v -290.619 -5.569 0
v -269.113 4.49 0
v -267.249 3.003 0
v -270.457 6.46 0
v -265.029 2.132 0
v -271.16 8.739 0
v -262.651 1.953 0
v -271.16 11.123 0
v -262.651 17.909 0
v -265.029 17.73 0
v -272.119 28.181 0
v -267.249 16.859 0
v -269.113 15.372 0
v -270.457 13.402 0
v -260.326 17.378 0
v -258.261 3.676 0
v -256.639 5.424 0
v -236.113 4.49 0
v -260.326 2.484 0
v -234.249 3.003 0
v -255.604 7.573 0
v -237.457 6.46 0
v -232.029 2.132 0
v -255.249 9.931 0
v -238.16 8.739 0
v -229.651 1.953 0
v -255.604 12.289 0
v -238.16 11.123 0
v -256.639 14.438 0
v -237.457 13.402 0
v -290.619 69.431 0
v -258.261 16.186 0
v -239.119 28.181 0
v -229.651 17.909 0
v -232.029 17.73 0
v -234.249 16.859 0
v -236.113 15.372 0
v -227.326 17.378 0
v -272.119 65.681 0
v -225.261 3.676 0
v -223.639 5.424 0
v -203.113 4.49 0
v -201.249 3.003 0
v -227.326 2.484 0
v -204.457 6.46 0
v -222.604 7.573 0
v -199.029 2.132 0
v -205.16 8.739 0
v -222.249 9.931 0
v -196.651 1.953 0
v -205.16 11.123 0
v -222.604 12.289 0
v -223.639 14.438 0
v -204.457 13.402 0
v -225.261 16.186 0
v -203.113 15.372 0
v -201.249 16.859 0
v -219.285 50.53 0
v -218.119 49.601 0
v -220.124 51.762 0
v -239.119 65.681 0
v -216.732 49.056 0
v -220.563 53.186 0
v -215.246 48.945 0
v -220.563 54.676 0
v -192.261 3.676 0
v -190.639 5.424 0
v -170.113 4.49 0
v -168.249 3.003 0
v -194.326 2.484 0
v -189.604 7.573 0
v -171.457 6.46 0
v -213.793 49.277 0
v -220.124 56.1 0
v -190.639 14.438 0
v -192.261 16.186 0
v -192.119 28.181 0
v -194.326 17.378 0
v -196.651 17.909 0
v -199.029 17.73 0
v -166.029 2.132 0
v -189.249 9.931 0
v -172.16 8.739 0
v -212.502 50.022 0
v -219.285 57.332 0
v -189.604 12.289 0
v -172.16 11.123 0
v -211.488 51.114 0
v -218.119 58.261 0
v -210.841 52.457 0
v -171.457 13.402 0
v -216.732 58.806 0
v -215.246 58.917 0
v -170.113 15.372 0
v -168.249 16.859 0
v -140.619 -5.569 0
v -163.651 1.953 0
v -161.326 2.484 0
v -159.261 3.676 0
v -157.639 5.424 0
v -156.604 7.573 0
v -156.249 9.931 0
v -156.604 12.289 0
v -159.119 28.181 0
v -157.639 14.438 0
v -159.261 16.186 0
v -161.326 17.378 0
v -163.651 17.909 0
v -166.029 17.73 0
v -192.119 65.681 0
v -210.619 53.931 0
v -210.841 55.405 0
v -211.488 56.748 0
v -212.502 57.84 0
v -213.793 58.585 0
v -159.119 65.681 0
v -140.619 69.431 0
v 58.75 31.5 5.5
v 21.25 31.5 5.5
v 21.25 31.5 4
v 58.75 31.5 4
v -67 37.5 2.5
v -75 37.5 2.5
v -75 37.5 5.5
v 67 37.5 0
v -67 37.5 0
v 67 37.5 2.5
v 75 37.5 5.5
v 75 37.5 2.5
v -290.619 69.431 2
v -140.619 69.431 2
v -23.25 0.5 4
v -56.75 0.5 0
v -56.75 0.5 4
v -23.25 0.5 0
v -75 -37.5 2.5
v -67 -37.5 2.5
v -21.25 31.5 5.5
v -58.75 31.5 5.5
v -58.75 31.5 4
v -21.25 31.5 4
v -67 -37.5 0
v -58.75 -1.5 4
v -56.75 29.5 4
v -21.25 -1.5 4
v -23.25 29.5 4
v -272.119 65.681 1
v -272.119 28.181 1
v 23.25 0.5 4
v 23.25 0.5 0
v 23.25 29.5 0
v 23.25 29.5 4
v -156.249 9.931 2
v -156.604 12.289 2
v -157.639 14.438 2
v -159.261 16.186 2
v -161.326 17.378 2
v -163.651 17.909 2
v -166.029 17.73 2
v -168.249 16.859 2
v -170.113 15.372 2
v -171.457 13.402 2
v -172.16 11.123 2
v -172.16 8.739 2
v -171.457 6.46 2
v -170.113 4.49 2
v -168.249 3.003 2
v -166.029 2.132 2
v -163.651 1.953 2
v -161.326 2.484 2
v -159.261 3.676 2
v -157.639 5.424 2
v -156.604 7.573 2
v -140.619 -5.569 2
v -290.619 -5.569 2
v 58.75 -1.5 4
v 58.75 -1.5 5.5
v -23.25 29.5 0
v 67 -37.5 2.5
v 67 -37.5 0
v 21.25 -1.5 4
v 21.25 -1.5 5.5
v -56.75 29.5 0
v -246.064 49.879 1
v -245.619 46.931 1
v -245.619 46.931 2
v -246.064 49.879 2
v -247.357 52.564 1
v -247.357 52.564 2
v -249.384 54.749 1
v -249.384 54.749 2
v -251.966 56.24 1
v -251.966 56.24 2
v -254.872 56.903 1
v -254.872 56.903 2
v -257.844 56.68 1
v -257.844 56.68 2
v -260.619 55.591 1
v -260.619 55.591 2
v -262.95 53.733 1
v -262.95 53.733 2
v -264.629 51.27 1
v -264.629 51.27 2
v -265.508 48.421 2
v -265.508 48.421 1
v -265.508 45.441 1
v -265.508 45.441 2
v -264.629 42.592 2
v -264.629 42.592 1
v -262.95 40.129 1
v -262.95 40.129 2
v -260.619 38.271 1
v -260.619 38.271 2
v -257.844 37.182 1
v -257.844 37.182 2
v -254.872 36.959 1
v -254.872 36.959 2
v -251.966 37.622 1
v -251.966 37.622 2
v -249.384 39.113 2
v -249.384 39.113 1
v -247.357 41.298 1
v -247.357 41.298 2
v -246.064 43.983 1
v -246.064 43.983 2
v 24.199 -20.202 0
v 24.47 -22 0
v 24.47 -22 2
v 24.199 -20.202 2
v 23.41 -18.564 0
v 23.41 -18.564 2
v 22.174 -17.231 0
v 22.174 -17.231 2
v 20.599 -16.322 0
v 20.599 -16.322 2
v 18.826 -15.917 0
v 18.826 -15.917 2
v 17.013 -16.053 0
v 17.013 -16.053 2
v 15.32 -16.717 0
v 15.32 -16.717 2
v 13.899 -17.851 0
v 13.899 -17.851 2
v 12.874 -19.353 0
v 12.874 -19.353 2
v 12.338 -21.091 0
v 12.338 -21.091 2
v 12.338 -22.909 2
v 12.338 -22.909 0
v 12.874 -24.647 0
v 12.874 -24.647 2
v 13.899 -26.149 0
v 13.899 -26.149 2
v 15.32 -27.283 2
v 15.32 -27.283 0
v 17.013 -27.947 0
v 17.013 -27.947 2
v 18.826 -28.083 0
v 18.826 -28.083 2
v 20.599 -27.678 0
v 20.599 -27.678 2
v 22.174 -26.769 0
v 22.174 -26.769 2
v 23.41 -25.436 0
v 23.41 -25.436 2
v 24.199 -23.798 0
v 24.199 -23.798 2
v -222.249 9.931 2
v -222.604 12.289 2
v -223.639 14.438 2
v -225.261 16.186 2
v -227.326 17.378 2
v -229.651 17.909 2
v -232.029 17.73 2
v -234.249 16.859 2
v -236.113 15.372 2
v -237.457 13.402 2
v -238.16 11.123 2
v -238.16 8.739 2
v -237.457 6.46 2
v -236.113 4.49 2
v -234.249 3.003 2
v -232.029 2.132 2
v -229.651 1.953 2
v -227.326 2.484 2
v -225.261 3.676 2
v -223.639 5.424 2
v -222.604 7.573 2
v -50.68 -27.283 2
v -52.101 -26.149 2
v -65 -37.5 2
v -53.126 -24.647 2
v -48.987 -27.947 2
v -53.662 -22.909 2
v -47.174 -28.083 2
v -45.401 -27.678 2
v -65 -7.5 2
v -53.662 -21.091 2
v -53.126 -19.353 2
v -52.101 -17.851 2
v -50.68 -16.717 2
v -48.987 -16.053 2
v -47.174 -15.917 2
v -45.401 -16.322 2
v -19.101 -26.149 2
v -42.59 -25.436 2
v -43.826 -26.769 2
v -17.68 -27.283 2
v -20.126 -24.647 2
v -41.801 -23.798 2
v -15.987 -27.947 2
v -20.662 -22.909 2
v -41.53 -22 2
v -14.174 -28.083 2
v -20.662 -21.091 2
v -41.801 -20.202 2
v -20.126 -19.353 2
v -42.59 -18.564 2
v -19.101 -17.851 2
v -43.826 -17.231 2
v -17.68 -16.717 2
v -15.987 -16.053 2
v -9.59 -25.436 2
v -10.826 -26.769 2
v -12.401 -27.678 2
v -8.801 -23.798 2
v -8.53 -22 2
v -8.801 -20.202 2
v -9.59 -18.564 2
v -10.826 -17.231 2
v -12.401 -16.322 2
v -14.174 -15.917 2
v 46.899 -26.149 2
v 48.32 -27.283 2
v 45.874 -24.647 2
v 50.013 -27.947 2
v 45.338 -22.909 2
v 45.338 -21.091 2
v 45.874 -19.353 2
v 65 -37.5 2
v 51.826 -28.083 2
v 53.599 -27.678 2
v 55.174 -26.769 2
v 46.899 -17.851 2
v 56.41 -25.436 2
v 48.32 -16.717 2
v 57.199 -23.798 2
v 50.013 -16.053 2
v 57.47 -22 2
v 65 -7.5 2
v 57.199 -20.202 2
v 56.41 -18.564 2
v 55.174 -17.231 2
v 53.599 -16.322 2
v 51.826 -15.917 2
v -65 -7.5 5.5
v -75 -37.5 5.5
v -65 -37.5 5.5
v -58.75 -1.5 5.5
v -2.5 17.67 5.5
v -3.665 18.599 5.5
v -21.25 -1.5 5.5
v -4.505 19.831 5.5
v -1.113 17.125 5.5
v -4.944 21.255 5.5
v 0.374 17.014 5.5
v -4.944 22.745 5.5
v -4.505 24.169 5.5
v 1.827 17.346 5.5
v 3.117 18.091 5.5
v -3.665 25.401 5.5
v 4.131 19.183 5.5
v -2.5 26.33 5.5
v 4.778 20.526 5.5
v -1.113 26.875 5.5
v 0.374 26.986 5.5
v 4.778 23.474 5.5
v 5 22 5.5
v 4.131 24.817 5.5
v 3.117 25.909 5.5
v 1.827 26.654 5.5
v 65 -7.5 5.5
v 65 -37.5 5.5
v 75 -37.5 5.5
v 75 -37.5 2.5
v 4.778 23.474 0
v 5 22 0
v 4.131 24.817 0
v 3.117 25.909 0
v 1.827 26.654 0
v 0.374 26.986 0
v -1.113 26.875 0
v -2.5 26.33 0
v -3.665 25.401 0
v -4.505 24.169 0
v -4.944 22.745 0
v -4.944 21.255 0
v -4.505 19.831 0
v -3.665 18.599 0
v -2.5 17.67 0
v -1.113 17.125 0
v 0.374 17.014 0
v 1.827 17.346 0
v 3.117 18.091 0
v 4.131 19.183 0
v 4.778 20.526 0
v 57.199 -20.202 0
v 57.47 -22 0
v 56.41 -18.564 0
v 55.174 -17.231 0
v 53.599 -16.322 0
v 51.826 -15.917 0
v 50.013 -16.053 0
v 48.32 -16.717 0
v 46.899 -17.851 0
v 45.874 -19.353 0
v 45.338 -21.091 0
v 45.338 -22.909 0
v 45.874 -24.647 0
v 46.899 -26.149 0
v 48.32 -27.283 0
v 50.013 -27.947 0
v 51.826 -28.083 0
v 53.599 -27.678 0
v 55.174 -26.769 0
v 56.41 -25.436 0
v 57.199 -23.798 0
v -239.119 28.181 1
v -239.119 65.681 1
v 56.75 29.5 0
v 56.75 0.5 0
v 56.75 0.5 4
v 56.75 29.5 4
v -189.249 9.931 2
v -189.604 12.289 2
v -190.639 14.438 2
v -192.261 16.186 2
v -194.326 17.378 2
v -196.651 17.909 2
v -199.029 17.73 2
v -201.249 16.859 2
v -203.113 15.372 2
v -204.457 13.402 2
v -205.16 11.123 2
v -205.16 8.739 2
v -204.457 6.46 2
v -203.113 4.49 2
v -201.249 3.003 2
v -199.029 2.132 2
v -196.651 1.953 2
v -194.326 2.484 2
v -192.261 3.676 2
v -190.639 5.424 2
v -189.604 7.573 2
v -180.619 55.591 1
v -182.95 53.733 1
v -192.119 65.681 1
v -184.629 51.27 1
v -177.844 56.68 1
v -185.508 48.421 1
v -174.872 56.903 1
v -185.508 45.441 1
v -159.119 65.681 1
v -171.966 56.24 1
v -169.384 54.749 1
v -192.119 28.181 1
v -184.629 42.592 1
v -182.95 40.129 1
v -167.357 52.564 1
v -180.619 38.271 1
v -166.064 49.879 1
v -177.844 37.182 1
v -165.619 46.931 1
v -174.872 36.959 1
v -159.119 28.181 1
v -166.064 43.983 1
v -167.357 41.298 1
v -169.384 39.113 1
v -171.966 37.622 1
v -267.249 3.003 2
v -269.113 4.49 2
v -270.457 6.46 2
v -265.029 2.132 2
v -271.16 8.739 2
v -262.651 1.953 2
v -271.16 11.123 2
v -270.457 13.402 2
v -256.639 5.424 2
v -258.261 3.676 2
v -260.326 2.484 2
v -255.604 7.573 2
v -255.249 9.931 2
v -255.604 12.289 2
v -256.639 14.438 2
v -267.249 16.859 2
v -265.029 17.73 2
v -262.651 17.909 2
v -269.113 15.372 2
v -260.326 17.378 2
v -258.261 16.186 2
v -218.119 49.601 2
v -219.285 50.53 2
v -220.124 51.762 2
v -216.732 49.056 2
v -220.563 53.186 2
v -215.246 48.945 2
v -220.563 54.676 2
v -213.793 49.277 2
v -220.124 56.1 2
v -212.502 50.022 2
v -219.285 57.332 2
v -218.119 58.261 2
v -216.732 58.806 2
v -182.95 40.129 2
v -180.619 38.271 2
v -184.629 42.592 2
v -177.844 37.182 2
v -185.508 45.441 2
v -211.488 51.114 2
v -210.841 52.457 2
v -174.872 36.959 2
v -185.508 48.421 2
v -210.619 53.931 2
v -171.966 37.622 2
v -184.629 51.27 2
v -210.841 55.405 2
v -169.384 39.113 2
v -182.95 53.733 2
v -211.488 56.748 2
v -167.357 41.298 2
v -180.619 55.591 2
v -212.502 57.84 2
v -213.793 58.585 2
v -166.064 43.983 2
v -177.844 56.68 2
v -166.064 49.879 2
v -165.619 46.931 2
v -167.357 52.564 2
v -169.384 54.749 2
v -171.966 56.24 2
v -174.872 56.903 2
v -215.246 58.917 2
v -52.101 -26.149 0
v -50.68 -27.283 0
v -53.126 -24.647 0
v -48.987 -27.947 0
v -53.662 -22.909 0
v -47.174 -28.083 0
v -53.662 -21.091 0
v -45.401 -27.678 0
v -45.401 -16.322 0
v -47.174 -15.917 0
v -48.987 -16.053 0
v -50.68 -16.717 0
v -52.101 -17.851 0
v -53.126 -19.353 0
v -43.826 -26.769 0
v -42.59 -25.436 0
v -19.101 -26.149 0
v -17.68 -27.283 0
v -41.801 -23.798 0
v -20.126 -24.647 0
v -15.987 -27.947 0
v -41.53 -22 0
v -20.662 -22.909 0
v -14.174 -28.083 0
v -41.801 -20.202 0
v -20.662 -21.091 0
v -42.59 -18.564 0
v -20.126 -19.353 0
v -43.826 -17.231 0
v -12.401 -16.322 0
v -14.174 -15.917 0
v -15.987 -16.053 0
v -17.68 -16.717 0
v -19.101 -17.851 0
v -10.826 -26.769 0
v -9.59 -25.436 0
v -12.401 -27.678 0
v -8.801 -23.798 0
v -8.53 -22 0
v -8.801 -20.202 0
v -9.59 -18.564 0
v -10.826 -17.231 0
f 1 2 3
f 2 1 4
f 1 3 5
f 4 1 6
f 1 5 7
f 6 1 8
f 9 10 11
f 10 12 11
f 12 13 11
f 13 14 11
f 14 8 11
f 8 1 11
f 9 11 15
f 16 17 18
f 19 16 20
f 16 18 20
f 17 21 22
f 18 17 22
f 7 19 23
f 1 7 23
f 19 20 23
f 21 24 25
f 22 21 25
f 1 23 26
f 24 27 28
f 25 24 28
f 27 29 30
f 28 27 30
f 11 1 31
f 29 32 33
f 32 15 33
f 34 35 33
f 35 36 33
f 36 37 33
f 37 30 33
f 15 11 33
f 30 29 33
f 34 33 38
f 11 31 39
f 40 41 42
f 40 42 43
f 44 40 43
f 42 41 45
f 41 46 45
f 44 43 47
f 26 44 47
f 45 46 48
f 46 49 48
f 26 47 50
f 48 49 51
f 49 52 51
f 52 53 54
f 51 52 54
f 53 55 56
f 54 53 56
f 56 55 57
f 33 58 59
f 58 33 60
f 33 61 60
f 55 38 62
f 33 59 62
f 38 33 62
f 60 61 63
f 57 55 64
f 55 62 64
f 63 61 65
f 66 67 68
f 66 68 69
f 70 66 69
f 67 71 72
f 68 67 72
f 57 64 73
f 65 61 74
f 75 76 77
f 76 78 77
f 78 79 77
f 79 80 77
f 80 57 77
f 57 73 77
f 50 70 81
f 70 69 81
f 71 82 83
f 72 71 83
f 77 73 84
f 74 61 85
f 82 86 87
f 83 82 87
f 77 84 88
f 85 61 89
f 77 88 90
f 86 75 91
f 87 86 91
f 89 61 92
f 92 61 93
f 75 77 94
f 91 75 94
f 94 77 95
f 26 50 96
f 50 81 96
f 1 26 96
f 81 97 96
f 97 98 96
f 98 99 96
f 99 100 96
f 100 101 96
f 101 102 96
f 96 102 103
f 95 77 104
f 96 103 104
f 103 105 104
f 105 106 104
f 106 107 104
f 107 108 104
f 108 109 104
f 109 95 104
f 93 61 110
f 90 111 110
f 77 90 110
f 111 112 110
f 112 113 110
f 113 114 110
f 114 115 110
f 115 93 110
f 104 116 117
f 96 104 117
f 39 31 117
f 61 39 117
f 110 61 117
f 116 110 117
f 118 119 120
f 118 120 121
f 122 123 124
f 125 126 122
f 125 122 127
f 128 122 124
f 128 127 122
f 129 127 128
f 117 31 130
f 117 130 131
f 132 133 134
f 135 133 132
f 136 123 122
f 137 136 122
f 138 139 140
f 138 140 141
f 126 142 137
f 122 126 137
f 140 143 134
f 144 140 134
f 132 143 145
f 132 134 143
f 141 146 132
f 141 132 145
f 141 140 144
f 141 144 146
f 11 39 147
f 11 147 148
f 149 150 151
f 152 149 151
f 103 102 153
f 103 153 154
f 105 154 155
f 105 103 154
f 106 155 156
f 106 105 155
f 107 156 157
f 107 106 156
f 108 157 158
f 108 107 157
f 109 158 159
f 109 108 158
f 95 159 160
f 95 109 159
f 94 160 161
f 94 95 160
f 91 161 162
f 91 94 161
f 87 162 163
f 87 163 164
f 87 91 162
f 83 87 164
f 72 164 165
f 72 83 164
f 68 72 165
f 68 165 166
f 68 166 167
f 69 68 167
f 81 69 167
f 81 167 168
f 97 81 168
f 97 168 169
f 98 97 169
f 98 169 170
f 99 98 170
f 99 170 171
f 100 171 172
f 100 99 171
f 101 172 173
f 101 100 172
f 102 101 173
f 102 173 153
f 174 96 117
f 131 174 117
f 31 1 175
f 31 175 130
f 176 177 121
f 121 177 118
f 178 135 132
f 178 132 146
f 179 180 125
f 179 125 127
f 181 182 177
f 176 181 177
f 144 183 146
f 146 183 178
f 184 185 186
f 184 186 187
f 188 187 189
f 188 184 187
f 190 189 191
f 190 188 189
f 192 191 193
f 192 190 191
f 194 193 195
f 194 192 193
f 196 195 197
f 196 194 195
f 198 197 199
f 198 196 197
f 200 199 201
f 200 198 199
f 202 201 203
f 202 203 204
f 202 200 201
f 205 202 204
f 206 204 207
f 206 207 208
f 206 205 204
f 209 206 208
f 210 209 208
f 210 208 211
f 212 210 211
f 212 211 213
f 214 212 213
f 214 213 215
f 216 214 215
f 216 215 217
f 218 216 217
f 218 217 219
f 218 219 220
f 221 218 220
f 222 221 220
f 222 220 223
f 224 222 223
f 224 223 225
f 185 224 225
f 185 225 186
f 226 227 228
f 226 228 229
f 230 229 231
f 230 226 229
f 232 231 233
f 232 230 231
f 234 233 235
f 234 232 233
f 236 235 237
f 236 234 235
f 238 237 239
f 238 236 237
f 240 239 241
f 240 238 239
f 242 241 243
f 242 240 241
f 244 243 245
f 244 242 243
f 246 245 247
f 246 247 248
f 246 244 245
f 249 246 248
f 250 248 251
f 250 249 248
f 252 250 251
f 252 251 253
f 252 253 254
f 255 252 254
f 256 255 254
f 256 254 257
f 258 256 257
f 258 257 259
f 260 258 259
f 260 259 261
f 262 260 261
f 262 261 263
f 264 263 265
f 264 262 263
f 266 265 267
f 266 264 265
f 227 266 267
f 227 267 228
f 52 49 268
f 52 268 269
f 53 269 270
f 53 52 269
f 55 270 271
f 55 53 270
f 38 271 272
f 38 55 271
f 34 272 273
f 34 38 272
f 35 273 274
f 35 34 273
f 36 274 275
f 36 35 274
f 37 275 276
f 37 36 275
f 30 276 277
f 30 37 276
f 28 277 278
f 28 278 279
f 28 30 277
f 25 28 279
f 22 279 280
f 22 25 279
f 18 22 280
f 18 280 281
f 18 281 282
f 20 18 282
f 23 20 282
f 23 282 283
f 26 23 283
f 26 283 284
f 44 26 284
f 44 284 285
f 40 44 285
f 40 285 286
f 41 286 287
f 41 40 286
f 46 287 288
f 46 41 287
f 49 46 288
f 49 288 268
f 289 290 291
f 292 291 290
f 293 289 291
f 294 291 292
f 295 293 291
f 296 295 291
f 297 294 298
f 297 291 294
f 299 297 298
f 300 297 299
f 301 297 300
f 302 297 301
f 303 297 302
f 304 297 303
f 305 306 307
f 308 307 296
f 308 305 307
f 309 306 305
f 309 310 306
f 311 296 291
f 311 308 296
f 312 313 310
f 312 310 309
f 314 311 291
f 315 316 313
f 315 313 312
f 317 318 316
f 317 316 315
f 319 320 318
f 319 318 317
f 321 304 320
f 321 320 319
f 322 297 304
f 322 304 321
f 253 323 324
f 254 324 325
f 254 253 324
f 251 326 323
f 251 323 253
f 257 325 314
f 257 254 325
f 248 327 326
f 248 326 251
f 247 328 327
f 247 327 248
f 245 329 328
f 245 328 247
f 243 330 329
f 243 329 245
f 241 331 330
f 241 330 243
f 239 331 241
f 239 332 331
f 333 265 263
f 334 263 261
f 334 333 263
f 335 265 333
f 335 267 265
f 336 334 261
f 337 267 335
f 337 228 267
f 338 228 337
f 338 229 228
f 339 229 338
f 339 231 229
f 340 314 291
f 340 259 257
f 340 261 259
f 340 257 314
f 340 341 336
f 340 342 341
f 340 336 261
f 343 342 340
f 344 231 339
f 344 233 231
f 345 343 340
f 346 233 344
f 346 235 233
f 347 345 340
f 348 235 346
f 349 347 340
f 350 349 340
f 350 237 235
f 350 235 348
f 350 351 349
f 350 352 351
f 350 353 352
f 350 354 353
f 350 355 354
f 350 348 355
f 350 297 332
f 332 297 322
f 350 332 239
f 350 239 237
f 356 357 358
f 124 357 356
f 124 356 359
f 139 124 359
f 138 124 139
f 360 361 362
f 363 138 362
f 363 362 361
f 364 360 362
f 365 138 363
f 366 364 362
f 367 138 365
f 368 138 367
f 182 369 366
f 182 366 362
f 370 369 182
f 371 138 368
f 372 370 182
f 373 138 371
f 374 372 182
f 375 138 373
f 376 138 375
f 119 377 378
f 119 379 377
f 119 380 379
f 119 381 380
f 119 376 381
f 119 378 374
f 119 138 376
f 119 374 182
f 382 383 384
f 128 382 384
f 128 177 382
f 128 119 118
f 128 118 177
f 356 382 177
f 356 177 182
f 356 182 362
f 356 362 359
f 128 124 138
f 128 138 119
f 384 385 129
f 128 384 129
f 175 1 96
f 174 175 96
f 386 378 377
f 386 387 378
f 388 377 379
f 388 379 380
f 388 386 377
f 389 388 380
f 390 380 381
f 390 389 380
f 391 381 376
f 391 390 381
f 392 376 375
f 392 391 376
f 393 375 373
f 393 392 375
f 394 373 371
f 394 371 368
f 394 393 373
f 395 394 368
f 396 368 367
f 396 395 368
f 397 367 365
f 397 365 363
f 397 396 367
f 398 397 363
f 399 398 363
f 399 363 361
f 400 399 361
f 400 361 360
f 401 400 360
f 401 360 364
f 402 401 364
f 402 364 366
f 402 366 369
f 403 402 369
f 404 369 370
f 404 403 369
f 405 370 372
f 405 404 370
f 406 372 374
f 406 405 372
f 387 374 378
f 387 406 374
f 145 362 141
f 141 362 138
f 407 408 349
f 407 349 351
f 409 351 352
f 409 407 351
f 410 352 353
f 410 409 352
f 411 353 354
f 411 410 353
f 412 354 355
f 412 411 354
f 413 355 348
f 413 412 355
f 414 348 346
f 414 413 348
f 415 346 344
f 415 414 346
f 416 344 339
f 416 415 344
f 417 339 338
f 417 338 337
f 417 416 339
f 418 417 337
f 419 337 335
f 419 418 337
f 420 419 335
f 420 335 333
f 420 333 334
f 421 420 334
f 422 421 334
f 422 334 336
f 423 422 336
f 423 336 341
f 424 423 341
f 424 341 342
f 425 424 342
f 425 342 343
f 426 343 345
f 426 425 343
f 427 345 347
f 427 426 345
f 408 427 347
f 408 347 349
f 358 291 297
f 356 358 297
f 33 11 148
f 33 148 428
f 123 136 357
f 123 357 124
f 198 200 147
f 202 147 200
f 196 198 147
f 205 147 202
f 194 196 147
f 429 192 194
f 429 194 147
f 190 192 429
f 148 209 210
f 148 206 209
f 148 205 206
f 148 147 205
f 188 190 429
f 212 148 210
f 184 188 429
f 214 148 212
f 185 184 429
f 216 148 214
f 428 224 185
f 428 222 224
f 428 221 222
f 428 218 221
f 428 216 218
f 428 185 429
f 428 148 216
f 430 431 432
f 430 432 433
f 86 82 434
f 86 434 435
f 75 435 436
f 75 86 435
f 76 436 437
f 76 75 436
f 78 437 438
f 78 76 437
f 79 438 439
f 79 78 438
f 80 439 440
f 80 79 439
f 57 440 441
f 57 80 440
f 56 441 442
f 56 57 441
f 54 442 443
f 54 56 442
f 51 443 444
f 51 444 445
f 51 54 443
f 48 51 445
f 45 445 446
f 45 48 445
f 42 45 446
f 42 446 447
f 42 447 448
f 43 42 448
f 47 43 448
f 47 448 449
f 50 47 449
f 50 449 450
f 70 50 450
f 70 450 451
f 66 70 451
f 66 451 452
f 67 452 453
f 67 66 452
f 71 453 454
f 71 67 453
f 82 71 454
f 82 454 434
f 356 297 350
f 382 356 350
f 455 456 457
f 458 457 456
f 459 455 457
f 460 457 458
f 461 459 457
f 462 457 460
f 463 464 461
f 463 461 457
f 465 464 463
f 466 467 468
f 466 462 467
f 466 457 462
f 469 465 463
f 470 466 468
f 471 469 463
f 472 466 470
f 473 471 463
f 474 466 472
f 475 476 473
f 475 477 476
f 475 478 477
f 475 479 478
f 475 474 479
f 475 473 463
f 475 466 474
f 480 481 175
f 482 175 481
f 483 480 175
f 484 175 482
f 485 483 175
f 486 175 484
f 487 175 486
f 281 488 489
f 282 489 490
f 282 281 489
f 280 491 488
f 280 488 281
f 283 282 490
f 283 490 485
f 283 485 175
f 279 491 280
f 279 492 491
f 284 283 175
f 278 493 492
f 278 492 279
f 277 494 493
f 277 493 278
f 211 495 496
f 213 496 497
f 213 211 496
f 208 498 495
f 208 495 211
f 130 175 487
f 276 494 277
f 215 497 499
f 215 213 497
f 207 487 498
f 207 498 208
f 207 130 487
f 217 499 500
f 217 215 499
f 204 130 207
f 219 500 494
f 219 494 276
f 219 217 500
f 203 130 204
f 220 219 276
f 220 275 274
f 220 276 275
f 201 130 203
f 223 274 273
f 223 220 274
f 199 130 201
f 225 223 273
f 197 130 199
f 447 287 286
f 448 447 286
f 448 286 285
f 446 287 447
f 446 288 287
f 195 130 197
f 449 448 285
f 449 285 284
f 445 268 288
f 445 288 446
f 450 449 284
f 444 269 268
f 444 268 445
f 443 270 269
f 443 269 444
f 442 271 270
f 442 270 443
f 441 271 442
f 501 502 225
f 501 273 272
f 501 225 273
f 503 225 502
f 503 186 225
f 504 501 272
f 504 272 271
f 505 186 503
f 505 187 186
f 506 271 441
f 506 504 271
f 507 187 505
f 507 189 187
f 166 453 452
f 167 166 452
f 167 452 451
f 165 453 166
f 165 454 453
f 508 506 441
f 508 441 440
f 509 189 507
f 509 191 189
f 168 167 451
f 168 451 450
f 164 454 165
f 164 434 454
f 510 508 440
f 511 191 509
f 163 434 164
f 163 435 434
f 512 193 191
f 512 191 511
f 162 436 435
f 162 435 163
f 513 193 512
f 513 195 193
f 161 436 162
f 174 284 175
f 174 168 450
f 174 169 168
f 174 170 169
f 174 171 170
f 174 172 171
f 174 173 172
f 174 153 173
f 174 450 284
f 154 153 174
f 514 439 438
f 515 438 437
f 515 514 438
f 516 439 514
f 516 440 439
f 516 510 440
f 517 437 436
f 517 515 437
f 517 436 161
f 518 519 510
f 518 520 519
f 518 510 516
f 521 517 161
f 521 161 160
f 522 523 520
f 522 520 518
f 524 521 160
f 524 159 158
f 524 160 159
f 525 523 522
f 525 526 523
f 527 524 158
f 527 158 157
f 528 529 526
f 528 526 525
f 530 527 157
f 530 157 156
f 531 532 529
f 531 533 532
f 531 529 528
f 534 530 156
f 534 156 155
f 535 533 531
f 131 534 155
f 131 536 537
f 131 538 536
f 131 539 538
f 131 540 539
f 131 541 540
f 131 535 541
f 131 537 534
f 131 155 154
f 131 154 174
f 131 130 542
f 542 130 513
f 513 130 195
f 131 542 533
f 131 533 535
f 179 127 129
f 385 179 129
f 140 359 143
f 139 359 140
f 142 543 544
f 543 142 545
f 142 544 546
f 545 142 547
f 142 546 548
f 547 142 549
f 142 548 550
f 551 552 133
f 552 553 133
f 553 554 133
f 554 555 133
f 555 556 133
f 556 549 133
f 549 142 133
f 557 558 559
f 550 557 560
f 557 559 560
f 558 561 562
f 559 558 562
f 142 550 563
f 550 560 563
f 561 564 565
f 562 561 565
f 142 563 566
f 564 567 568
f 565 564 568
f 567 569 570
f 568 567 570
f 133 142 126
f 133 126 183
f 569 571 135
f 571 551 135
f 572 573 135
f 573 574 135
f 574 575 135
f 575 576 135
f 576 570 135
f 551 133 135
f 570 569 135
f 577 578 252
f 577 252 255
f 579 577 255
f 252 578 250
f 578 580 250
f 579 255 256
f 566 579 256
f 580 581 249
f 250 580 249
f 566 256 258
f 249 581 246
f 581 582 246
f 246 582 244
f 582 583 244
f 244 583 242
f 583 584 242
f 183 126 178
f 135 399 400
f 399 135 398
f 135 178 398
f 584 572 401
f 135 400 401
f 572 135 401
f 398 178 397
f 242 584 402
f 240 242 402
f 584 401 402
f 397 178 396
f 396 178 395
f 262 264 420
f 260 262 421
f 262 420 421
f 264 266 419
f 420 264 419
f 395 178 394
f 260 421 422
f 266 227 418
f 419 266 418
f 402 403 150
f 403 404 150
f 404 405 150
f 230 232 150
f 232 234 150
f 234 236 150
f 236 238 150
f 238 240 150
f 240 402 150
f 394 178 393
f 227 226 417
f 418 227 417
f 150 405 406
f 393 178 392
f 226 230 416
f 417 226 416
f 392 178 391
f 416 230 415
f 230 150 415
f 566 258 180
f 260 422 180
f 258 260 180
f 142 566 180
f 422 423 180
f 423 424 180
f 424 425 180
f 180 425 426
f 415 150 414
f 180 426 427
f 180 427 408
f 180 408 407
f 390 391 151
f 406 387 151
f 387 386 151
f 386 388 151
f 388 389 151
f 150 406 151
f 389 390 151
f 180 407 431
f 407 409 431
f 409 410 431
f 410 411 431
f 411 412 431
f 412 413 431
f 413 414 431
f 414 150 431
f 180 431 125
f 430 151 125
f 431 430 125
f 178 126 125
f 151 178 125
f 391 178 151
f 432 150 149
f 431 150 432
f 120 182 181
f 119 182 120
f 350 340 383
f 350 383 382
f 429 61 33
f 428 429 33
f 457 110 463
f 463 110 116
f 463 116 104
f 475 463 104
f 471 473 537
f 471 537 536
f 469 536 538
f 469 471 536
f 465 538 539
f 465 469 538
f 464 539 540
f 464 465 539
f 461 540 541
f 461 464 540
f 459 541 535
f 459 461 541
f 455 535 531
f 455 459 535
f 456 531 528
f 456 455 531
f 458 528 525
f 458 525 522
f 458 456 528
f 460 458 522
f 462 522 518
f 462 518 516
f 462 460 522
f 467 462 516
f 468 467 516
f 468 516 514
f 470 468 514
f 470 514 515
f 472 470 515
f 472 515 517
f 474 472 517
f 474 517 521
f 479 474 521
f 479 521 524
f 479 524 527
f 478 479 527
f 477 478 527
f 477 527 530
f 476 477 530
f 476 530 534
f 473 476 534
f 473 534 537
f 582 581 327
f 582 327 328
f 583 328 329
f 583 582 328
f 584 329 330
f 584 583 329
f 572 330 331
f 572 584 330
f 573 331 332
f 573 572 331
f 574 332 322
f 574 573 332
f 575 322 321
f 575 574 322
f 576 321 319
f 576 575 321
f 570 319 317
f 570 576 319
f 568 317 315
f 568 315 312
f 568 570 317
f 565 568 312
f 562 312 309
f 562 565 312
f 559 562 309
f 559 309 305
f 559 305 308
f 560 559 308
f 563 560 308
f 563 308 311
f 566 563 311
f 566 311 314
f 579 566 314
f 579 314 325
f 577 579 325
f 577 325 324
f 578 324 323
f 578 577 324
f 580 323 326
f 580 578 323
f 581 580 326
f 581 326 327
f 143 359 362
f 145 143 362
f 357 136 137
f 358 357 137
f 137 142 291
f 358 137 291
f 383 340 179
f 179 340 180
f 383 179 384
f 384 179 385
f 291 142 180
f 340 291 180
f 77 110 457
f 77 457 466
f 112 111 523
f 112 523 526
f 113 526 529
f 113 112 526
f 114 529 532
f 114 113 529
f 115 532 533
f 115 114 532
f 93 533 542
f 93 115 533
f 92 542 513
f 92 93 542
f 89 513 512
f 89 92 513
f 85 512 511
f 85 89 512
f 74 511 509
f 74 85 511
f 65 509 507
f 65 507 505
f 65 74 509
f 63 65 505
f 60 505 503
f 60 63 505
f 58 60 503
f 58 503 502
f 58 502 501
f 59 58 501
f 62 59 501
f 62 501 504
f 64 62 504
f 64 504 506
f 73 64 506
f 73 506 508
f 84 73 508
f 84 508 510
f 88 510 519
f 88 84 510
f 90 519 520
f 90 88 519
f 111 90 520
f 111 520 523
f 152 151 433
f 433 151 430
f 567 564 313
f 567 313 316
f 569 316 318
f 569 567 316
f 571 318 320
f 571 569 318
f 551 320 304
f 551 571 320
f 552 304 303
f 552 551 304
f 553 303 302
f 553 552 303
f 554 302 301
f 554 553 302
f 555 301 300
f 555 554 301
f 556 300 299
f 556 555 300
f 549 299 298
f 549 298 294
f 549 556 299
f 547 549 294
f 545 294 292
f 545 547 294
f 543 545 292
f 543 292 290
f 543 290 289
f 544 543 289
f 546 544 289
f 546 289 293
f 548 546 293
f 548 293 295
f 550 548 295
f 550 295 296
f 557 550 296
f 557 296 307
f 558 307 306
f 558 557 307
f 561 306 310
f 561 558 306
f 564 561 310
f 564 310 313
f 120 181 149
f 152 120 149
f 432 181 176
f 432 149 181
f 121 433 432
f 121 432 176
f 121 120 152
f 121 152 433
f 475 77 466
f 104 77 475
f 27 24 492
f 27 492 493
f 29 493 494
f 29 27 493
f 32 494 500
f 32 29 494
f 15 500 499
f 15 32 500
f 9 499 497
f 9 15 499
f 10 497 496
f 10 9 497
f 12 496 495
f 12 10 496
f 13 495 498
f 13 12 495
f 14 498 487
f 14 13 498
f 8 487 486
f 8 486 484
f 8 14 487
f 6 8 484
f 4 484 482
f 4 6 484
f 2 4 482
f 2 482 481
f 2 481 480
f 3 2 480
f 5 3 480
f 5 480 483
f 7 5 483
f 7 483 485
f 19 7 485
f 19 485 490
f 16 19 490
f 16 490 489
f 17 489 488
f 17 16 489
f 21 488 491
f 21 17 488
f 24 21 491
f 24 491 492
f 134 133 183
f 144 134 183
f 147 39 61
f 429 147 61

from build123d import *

# Parameters (mm, degrees)
F0_W      = 150
F0_H      = 75
F0_R      = 1.5
F0_R_2    = 6.1
F0_W_2    = 33.5
F0_H_2    = 29
F0_R_3    = 5
F1_DEPTH  = 2
F2_W      = 10
F2_H      = 75
F3_DEPTH  = 3.5
F4_W      = 8
F4_H      = 2.5
F5_DEPTH  = 80
F6_W      = 130
F6_H      = 45
F6_W_2    = 33.5
F6_H_2    = 29
F6_R      = 5
F7_DEPTH  = 3.5
F8_W      = 37.5
F8_H      = 33
F8_W_2    = 33.5
F8_H_2    = 29
F9_DEPTH  = 1.5
F10_W     = 150
F10_H     = 75
F10_R     = 8
F10_R_2   = 10
F10_R_3   = 5
F11_DEPTH = 2
F12_W     = 33
F12_H     = 37.5
F13_DEPTH = 1


# Not quite as in the source:
# - a feature names something its author has since deleted; it is built from what else it names


with BuildPart() as f1:
    # F0 (on Top) → F1 (new body)
    with BuildSketch(Plane.XY):
        Rectangle(F0_W, F0_H)
        with Locations((-70, -25)):
            Circle(F0_R, mode=Mode.SUBTRACT)
        with Locations((-47.6297214627, -22)):
            Circle(F0_R_2, mode=Mode.SUBTRACT)
        with Locations((-14.6297214627, -22)):
            Circle(F0_R_2, mode=Mode.SUBTRACT)
        with Locations((18.3702785373, -22)):
            Circle(F0_R_2, mode=Mode.SUBTRACT)
        with Locations((51.3702785373, -22)):
            Circle(F0_R_2, mode=Mode.SUBTRACT)
        with Locations((70, -25)):
            Circle(F0_R, mode=Mode.SUBTRACT)
        with Locations((-40, 15)):
            Rectangle(F0_W_2, F0_H_2, mode=Mode.SUBTRACT)
        with Locations((-70, 25)):
            Circle(F0_R, mode=Mode.SUBTRACT)
        with Locations((40, 15)):
            Rectangle(F0_W_2, F0_H_2, mode=Mode.SUBTRACT)
        with Locations((0, 22)):
            Circle(F0_R_3, mode=Mode.SUBTRACT)
        with Locations((70, 25)):
            Circle(F0_R, mode=Mode.SUBTRACT)
    extrude(amount=F1_DEPTH)

    # F2 (on face) → F3 (join)
    with BuildSketch(Plane.XY.offset(2)):
        with Locations((-70, 0)):
            Rectangle(F2_W, F2_H)
        with Locations((70, 0)):
            Rectangle(F2_W, F2_H)
    extrude(amount=F3_DEPTH)

    # F4 (on face) → F5 (cut)
    with BuildSketch(Plane.XZ.offset(37.5)):
        with Locations((-71, 1.25)):
            Rectangle(F4_W, F4_H)
        with Locations((71, 1.25)):
            Rectangle(F4_W, F4_H)
    extrude(amount=-F5_DEPTH, mode=Mode.SUBTRACT)

    # F6 (on face) → F7 (join)
    with BuildSketch(Plane.XY.offset(2)):
        with Locations((0, 15)):
            Rectangle(F6_W, F6_H)
        with Locations((-40, 15)):
            Rectangle(F6_W_2, F6_H_2, mode=Mode.SUBTRACT)
        with Locations((0, 22)):
            Circle(F6_R, mode=Mode.SUBTRACT)
        with Locations((40, 15)):
            Rectangle(F6_W_2, F6_H_2, mode=Mode.SUBTRACT)
    extrude(amount=F7_DEPTH)

    # F8 (on face) → F9 (cut)
    with BuildSketch(Plane.XY.offset(5.5)):
        with Locations((-40, 15)):
            Rectangle(F8_W, F8_H)
        with Locations((-40, 15)):
            Rectangle(F8_W_2, F8_H_2, mode=Mode.SUBTRACT)
        with Locations((40, 15)):
            Rectangle(F8_W, F8_H)
        with Locations((40, 15)):
            Rectangle(F8_W_2, F8_H_2, mode=Mode.SUBTRACT)
    extrude(amount=-F9_DEPTH, mode=Mode.SUBTRACT)


with BuildPart() as f11:
    # F10 (on Top) → F11 (new body)
    with BuildSketch(Plane.XY):
        with Locations((-215.6192851201, 31.9309936473)):
            Rectangle(F10_W, F10_H)
        with Locations((-263.2490065828, 9.9309936473)):
            Circle(F10_R, mode=Mode.SUBTRACT)
        with Locations((-230.2490065828, 9.9309936473)):
            Circle(F10_R, mode=Mode.SUBTRACT)
        with Locations((-197.2490065828, 9.9309936473)):
            Circle(F10_R, mode=Mode.SUBTRACT)
        with Locations((-164.2490065828, 9.9309936473)):
            Circle(F10_R, mode=Mode.SUBTRACT)
        with Locations((-255.6192851201, 46.9309936473)):
            Circle(F10_R_2, mode=Mode.SUBTRACT)
        with Locations((-175.6192851201, 46.9309936473)):
            Circle(F10_R_2, mode=Mode.SUBTRACT)
        with Locations((-215.6192851201, 53.9309936473)):
            Circle(F10_R_3, mode=Mode.SUBTRACT)
    extrude(amount=F11_DEPTH)

    # F12 (on face) → F13 (cut)
    with BuildSketch(Plane(origin=(0, 0, 0), x_dir=(1, 0, 0), z_dir=(0, 0, -1))):
        with Locations((-255.6192851201, -46.9309936473)):
            Rectangle(F12_W, F12_H)
        with Locations((-175.6192851201, -46.9309936473)):
            Rectangle(F12_W, F12_H)
    extrude(amount=-F13_DEPTH, mode=Mode.SUBTRACT)


solid = Compound([f1.part, f11.part])
